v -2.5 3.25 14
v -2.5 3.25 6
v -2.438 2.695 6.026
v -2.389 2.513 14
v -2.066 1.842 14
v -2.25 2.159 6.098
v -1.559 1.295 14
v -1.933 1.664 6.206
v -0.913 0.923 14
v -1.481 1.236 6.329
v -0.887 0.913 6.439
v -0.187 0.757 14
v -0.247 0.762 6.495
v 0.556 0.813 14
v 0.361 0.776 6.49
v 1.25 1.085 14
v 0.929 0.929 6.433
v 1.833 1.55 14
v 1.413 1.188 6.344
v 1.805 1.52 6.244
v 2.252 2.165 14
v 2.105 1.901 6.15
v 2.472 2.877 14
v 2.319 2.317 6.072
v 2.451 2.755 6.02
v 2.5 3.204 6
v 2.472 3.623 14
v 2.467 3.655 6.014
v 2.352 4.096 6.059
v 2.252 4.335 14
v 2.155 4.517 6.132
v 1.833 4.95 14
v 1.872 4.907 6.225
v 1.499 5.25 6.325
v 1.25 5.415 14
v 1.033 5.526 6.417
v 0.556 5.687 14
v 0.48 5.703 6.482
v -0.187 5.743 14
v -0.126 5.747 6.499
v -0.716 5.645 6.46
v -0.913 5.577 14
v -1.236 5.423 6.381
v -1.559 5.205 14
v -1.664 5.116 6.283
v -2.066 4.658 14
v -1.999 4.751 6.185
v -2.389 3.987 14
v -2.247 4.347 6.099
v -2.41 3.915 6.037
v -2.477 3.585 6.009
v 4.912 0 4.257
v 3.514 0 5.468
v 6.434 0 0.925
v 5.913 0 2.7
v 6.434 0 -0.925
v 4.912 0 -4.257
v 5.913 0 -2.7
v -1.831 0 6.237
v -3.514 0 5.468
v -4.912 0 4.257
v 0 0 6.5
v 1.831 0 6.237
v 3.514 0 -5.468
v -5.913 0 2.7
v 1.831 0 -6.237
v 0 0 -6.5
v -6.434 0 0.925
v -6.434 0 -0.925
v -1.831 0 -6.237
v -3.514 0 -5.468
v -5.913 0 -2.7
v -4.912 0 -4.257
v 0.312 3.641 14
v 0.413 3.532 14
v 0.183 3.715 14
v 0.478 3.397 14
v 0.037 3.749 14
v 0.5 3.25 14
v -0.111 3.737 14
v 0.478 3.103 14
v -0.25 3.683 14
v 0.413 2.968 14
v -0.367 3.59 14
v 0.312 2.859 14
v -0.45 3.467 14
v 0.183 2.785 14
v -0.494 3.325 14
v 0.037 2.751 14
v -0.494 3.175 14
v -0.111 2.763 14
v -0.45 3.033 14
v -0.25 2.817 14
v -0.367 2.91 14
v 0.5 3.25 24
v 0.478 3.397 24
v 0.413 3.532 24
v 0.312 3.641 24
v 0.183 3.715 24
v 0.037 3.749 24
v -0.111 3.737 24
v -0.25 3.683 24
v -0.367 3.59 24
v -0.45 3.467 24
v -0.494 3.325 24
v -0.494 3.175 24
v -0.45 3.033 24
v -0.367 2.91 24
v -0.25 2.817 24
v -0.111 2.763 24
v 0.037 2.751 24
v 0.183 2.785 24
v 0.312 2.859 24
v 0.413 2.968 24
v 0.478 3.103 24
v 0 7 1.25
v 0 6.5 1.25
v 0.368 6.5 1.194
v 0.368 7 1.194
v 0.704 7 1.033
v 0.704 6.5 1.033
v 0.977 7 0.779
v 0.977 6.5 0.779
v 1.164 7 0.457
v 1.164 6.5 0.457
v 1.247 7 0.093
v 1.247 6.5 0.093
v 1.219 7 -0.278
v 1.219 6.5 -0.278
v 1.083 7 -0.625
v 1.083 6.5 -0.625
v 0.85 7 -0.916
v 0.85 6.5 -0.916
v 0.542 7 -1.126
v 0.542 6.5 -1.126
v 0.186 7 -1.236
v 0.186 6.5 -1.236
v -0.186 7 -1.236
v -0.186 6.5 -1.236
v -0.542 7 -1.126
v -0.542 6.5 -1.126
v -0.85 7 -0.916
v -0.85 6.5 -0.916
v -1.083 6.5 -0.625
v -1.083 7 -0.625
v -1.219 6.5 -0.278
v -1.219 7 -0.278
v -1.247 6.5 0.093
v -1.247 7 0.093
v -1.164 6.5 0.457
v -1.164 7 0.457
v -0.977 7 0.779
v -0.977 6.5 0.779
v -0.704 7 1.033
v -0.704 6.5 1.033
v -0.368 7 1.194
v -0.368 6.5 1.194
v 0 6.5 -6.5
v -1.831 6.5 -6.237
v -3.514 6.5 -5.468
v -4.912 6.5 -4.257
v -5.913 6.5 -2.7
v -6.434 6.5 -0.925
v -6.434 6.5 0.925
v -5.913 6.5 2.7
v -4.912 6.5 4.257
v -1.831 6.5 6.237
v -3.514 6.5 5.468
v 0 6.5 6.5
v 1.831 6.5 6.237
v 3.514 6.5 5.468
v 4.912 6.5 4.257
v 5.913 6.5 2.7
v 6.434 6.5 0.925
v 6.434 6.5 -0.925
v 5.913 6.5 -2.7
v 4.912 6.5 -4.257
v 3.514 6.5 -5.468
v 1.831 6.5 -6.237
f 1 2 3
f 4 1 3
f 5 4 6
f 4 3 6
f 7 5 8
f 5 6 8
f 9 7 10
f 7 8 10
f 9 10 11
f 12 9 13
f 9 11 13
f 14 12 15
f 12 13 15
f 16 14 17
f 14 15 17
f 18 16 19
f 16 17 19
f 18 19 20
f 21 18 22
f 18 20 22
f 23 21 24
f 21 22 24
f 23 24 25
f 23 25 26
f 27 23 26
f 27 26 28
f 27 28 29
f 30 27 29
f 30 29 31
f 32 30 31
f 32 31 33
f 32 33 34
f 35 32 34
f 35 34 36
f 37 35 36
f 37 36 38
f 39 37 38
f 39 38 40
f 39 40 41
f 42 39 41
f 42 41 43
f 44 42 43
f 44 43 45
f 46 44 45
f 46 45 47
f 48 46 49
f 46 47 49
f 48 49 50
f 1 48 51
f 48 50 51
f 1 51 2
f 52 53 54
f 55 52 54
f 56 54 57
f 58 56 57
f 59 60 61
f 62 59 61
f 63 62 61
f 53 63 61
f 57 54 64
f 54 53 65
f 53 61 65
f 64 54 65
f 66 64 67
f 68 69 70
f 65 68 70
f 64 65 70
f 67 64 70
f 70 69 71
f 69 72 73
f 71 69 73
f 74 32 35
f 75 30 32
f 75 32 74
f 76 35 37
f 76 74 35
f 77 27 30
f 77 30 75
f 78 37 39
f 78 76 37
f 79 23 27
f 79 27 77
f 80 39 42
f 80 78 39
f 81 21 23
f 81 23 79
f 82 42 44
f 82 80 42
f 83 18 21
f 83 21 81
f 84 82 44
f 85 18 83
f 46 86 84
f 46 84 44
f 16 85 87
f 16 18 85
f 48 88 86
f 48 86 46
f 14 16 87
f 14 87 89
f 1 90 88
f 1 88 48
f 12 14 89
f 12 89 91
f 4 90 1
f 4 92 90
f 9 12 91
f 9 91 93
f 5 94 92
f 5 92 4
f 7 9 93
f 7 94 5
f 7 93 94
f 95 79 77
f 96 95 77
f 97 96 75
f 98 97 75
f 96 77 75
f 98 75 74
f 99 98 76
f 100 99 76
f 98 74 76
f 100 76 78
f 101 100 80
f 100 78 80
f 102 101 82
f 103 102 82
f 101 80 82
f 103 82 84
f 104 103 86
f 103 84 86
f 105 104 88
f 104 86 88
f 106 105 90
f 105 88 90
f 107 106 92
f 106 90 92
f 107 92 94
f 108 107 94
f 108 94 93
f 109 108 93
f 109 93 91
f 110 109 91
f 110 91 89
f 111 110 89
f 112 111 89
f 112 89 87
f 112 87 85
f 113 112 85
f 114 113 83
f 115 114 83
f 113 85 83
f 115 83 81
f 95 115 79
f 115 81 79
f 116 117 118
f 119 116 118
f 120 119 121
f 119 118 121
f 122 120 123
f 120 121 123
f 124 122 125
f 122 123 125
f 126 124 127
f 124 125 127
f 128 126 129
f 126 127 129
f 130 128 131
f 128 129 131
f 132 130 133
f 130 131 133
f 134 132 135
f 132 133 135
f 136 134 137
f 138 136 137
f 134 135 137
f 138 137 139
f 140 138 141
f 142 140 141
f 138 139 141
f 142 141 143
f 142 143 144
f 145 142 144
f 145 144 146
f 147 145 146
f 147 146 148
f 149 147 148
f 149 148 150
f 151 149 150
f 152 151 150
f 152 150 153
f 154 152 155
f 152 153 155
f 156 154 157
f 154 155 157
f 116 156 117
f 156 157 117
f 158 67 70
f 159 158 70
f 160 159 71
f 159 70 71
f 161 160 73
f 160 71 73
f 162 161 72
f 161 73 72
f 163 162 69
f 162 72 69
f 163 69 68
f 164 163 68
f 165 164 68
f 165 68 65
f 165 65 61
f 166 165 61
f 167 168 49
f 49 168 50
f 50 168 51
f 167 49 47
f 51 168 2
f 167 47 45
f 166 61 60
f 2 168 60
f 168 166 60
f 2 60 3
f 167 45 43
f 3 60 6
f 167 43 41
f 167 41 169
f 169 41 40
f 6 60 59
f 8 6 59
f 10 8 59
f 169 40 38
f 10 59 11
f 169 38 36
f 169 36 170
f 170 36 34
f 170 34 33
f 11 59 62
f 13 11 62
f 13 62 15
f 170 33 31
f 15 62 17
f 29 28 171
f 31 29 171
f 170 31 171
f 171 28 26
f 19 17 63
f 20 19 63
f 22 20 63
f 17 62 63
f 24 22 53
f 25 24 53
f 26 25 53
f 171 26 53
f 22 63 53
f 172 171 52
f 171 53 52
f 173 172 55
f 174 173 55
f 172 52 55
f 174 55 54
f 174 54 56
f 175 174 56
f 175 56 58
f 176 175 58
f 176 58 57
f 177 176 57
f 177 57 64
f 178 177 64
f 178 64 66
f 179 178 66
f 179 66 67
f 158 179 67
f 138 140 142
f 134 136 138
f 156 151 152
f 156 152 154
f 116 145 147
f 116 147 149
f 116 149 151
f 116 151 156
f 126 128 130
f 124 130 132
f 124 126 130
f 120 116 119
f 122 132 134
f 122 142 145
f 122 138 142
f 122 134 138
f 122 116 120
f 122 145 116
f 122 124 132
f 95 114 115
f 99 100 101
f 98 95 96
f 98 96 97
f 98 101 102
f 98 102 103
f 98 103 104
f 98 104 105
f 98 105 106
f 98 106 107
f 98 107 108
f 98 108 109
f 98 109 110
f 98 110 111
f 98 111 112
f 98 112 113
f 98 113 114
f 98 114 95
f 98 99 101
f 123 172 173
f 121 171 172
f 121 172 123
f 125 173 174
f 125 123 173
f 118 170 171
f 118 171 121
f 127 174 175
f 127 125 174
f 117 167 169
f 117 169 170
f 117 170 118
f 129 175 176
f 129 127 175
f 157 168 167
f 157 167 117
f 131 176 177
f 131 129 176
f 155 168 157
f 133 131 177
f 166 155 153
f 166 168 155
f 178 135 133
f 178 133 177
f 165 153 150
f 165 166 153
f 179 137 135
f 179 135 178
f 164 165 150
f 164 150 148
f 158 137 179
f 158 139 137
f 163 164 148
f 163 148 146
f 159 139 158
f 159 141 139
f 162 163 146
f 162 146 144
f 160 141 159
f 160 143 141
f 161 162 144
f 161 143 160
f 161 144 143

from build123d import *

# Parameters (mm, degrees)
SKETCH1_R           = 6.5
BOSS_EXTRUDE1_DEPTH = 6.5
SKETCH2_R           = 1.25
BOSS_EXTRUDE2_DEPTH = 0.5
SKETCH4_R           = 2.5
BOSS_EXTRUDE4_DEPTH = 14
SKETCH5_R           = 0.5
BOSS_EXTRUDE5_DEPTH = 10


with BuildPart() as part:
    # Sketch1 → Boss-Extrude1 (new body)
    with BuildSketch(Plane(origin=(0, 0, 0), x_dir=(1, 0, 0), z_dir=(0, 1, 0))):
        with Locations(Location((0, 0, 0), (0, 0, 90))):
            Circle(SKETCH1_R)
    extrude(amount=BOSS_EXTRUDE1_DEPTH)

    # Sketch2 → Boss-Extrude2 (add)
    with BuildSketch(Plane(origin=(0, 6.5, 0), x_dir=(1, 0, 0), z_dir=(0, 1, 0))):
        with Locations(Location((0, 0, 0), (0, 0, 270))):
            Circle(SKETCH2_R)
    extrude(amount=BOSS_EXTRUDE2_DEPTH)

    # Sketch4 → Boss-Extrude4 (add)
    with BuildSketch(Plane.XY):
        with Locations(Location((0, 3.25, 0), (0, 0, 180))):
            Circle(SKETCH4_R)
    extrude(amount=BOSS_EXTRUDE4_DEPTH)

    # Sketch5 → Boss-Extrude5 (add)
    with BuildSketch(Plane.XY.offset(14)):
        with Locations((0, 3.25)):
            Circle(SKETCH5_R)
    extrude(amount=BOSS_EXTRUDE5_DEPTH)


solid = part.part
